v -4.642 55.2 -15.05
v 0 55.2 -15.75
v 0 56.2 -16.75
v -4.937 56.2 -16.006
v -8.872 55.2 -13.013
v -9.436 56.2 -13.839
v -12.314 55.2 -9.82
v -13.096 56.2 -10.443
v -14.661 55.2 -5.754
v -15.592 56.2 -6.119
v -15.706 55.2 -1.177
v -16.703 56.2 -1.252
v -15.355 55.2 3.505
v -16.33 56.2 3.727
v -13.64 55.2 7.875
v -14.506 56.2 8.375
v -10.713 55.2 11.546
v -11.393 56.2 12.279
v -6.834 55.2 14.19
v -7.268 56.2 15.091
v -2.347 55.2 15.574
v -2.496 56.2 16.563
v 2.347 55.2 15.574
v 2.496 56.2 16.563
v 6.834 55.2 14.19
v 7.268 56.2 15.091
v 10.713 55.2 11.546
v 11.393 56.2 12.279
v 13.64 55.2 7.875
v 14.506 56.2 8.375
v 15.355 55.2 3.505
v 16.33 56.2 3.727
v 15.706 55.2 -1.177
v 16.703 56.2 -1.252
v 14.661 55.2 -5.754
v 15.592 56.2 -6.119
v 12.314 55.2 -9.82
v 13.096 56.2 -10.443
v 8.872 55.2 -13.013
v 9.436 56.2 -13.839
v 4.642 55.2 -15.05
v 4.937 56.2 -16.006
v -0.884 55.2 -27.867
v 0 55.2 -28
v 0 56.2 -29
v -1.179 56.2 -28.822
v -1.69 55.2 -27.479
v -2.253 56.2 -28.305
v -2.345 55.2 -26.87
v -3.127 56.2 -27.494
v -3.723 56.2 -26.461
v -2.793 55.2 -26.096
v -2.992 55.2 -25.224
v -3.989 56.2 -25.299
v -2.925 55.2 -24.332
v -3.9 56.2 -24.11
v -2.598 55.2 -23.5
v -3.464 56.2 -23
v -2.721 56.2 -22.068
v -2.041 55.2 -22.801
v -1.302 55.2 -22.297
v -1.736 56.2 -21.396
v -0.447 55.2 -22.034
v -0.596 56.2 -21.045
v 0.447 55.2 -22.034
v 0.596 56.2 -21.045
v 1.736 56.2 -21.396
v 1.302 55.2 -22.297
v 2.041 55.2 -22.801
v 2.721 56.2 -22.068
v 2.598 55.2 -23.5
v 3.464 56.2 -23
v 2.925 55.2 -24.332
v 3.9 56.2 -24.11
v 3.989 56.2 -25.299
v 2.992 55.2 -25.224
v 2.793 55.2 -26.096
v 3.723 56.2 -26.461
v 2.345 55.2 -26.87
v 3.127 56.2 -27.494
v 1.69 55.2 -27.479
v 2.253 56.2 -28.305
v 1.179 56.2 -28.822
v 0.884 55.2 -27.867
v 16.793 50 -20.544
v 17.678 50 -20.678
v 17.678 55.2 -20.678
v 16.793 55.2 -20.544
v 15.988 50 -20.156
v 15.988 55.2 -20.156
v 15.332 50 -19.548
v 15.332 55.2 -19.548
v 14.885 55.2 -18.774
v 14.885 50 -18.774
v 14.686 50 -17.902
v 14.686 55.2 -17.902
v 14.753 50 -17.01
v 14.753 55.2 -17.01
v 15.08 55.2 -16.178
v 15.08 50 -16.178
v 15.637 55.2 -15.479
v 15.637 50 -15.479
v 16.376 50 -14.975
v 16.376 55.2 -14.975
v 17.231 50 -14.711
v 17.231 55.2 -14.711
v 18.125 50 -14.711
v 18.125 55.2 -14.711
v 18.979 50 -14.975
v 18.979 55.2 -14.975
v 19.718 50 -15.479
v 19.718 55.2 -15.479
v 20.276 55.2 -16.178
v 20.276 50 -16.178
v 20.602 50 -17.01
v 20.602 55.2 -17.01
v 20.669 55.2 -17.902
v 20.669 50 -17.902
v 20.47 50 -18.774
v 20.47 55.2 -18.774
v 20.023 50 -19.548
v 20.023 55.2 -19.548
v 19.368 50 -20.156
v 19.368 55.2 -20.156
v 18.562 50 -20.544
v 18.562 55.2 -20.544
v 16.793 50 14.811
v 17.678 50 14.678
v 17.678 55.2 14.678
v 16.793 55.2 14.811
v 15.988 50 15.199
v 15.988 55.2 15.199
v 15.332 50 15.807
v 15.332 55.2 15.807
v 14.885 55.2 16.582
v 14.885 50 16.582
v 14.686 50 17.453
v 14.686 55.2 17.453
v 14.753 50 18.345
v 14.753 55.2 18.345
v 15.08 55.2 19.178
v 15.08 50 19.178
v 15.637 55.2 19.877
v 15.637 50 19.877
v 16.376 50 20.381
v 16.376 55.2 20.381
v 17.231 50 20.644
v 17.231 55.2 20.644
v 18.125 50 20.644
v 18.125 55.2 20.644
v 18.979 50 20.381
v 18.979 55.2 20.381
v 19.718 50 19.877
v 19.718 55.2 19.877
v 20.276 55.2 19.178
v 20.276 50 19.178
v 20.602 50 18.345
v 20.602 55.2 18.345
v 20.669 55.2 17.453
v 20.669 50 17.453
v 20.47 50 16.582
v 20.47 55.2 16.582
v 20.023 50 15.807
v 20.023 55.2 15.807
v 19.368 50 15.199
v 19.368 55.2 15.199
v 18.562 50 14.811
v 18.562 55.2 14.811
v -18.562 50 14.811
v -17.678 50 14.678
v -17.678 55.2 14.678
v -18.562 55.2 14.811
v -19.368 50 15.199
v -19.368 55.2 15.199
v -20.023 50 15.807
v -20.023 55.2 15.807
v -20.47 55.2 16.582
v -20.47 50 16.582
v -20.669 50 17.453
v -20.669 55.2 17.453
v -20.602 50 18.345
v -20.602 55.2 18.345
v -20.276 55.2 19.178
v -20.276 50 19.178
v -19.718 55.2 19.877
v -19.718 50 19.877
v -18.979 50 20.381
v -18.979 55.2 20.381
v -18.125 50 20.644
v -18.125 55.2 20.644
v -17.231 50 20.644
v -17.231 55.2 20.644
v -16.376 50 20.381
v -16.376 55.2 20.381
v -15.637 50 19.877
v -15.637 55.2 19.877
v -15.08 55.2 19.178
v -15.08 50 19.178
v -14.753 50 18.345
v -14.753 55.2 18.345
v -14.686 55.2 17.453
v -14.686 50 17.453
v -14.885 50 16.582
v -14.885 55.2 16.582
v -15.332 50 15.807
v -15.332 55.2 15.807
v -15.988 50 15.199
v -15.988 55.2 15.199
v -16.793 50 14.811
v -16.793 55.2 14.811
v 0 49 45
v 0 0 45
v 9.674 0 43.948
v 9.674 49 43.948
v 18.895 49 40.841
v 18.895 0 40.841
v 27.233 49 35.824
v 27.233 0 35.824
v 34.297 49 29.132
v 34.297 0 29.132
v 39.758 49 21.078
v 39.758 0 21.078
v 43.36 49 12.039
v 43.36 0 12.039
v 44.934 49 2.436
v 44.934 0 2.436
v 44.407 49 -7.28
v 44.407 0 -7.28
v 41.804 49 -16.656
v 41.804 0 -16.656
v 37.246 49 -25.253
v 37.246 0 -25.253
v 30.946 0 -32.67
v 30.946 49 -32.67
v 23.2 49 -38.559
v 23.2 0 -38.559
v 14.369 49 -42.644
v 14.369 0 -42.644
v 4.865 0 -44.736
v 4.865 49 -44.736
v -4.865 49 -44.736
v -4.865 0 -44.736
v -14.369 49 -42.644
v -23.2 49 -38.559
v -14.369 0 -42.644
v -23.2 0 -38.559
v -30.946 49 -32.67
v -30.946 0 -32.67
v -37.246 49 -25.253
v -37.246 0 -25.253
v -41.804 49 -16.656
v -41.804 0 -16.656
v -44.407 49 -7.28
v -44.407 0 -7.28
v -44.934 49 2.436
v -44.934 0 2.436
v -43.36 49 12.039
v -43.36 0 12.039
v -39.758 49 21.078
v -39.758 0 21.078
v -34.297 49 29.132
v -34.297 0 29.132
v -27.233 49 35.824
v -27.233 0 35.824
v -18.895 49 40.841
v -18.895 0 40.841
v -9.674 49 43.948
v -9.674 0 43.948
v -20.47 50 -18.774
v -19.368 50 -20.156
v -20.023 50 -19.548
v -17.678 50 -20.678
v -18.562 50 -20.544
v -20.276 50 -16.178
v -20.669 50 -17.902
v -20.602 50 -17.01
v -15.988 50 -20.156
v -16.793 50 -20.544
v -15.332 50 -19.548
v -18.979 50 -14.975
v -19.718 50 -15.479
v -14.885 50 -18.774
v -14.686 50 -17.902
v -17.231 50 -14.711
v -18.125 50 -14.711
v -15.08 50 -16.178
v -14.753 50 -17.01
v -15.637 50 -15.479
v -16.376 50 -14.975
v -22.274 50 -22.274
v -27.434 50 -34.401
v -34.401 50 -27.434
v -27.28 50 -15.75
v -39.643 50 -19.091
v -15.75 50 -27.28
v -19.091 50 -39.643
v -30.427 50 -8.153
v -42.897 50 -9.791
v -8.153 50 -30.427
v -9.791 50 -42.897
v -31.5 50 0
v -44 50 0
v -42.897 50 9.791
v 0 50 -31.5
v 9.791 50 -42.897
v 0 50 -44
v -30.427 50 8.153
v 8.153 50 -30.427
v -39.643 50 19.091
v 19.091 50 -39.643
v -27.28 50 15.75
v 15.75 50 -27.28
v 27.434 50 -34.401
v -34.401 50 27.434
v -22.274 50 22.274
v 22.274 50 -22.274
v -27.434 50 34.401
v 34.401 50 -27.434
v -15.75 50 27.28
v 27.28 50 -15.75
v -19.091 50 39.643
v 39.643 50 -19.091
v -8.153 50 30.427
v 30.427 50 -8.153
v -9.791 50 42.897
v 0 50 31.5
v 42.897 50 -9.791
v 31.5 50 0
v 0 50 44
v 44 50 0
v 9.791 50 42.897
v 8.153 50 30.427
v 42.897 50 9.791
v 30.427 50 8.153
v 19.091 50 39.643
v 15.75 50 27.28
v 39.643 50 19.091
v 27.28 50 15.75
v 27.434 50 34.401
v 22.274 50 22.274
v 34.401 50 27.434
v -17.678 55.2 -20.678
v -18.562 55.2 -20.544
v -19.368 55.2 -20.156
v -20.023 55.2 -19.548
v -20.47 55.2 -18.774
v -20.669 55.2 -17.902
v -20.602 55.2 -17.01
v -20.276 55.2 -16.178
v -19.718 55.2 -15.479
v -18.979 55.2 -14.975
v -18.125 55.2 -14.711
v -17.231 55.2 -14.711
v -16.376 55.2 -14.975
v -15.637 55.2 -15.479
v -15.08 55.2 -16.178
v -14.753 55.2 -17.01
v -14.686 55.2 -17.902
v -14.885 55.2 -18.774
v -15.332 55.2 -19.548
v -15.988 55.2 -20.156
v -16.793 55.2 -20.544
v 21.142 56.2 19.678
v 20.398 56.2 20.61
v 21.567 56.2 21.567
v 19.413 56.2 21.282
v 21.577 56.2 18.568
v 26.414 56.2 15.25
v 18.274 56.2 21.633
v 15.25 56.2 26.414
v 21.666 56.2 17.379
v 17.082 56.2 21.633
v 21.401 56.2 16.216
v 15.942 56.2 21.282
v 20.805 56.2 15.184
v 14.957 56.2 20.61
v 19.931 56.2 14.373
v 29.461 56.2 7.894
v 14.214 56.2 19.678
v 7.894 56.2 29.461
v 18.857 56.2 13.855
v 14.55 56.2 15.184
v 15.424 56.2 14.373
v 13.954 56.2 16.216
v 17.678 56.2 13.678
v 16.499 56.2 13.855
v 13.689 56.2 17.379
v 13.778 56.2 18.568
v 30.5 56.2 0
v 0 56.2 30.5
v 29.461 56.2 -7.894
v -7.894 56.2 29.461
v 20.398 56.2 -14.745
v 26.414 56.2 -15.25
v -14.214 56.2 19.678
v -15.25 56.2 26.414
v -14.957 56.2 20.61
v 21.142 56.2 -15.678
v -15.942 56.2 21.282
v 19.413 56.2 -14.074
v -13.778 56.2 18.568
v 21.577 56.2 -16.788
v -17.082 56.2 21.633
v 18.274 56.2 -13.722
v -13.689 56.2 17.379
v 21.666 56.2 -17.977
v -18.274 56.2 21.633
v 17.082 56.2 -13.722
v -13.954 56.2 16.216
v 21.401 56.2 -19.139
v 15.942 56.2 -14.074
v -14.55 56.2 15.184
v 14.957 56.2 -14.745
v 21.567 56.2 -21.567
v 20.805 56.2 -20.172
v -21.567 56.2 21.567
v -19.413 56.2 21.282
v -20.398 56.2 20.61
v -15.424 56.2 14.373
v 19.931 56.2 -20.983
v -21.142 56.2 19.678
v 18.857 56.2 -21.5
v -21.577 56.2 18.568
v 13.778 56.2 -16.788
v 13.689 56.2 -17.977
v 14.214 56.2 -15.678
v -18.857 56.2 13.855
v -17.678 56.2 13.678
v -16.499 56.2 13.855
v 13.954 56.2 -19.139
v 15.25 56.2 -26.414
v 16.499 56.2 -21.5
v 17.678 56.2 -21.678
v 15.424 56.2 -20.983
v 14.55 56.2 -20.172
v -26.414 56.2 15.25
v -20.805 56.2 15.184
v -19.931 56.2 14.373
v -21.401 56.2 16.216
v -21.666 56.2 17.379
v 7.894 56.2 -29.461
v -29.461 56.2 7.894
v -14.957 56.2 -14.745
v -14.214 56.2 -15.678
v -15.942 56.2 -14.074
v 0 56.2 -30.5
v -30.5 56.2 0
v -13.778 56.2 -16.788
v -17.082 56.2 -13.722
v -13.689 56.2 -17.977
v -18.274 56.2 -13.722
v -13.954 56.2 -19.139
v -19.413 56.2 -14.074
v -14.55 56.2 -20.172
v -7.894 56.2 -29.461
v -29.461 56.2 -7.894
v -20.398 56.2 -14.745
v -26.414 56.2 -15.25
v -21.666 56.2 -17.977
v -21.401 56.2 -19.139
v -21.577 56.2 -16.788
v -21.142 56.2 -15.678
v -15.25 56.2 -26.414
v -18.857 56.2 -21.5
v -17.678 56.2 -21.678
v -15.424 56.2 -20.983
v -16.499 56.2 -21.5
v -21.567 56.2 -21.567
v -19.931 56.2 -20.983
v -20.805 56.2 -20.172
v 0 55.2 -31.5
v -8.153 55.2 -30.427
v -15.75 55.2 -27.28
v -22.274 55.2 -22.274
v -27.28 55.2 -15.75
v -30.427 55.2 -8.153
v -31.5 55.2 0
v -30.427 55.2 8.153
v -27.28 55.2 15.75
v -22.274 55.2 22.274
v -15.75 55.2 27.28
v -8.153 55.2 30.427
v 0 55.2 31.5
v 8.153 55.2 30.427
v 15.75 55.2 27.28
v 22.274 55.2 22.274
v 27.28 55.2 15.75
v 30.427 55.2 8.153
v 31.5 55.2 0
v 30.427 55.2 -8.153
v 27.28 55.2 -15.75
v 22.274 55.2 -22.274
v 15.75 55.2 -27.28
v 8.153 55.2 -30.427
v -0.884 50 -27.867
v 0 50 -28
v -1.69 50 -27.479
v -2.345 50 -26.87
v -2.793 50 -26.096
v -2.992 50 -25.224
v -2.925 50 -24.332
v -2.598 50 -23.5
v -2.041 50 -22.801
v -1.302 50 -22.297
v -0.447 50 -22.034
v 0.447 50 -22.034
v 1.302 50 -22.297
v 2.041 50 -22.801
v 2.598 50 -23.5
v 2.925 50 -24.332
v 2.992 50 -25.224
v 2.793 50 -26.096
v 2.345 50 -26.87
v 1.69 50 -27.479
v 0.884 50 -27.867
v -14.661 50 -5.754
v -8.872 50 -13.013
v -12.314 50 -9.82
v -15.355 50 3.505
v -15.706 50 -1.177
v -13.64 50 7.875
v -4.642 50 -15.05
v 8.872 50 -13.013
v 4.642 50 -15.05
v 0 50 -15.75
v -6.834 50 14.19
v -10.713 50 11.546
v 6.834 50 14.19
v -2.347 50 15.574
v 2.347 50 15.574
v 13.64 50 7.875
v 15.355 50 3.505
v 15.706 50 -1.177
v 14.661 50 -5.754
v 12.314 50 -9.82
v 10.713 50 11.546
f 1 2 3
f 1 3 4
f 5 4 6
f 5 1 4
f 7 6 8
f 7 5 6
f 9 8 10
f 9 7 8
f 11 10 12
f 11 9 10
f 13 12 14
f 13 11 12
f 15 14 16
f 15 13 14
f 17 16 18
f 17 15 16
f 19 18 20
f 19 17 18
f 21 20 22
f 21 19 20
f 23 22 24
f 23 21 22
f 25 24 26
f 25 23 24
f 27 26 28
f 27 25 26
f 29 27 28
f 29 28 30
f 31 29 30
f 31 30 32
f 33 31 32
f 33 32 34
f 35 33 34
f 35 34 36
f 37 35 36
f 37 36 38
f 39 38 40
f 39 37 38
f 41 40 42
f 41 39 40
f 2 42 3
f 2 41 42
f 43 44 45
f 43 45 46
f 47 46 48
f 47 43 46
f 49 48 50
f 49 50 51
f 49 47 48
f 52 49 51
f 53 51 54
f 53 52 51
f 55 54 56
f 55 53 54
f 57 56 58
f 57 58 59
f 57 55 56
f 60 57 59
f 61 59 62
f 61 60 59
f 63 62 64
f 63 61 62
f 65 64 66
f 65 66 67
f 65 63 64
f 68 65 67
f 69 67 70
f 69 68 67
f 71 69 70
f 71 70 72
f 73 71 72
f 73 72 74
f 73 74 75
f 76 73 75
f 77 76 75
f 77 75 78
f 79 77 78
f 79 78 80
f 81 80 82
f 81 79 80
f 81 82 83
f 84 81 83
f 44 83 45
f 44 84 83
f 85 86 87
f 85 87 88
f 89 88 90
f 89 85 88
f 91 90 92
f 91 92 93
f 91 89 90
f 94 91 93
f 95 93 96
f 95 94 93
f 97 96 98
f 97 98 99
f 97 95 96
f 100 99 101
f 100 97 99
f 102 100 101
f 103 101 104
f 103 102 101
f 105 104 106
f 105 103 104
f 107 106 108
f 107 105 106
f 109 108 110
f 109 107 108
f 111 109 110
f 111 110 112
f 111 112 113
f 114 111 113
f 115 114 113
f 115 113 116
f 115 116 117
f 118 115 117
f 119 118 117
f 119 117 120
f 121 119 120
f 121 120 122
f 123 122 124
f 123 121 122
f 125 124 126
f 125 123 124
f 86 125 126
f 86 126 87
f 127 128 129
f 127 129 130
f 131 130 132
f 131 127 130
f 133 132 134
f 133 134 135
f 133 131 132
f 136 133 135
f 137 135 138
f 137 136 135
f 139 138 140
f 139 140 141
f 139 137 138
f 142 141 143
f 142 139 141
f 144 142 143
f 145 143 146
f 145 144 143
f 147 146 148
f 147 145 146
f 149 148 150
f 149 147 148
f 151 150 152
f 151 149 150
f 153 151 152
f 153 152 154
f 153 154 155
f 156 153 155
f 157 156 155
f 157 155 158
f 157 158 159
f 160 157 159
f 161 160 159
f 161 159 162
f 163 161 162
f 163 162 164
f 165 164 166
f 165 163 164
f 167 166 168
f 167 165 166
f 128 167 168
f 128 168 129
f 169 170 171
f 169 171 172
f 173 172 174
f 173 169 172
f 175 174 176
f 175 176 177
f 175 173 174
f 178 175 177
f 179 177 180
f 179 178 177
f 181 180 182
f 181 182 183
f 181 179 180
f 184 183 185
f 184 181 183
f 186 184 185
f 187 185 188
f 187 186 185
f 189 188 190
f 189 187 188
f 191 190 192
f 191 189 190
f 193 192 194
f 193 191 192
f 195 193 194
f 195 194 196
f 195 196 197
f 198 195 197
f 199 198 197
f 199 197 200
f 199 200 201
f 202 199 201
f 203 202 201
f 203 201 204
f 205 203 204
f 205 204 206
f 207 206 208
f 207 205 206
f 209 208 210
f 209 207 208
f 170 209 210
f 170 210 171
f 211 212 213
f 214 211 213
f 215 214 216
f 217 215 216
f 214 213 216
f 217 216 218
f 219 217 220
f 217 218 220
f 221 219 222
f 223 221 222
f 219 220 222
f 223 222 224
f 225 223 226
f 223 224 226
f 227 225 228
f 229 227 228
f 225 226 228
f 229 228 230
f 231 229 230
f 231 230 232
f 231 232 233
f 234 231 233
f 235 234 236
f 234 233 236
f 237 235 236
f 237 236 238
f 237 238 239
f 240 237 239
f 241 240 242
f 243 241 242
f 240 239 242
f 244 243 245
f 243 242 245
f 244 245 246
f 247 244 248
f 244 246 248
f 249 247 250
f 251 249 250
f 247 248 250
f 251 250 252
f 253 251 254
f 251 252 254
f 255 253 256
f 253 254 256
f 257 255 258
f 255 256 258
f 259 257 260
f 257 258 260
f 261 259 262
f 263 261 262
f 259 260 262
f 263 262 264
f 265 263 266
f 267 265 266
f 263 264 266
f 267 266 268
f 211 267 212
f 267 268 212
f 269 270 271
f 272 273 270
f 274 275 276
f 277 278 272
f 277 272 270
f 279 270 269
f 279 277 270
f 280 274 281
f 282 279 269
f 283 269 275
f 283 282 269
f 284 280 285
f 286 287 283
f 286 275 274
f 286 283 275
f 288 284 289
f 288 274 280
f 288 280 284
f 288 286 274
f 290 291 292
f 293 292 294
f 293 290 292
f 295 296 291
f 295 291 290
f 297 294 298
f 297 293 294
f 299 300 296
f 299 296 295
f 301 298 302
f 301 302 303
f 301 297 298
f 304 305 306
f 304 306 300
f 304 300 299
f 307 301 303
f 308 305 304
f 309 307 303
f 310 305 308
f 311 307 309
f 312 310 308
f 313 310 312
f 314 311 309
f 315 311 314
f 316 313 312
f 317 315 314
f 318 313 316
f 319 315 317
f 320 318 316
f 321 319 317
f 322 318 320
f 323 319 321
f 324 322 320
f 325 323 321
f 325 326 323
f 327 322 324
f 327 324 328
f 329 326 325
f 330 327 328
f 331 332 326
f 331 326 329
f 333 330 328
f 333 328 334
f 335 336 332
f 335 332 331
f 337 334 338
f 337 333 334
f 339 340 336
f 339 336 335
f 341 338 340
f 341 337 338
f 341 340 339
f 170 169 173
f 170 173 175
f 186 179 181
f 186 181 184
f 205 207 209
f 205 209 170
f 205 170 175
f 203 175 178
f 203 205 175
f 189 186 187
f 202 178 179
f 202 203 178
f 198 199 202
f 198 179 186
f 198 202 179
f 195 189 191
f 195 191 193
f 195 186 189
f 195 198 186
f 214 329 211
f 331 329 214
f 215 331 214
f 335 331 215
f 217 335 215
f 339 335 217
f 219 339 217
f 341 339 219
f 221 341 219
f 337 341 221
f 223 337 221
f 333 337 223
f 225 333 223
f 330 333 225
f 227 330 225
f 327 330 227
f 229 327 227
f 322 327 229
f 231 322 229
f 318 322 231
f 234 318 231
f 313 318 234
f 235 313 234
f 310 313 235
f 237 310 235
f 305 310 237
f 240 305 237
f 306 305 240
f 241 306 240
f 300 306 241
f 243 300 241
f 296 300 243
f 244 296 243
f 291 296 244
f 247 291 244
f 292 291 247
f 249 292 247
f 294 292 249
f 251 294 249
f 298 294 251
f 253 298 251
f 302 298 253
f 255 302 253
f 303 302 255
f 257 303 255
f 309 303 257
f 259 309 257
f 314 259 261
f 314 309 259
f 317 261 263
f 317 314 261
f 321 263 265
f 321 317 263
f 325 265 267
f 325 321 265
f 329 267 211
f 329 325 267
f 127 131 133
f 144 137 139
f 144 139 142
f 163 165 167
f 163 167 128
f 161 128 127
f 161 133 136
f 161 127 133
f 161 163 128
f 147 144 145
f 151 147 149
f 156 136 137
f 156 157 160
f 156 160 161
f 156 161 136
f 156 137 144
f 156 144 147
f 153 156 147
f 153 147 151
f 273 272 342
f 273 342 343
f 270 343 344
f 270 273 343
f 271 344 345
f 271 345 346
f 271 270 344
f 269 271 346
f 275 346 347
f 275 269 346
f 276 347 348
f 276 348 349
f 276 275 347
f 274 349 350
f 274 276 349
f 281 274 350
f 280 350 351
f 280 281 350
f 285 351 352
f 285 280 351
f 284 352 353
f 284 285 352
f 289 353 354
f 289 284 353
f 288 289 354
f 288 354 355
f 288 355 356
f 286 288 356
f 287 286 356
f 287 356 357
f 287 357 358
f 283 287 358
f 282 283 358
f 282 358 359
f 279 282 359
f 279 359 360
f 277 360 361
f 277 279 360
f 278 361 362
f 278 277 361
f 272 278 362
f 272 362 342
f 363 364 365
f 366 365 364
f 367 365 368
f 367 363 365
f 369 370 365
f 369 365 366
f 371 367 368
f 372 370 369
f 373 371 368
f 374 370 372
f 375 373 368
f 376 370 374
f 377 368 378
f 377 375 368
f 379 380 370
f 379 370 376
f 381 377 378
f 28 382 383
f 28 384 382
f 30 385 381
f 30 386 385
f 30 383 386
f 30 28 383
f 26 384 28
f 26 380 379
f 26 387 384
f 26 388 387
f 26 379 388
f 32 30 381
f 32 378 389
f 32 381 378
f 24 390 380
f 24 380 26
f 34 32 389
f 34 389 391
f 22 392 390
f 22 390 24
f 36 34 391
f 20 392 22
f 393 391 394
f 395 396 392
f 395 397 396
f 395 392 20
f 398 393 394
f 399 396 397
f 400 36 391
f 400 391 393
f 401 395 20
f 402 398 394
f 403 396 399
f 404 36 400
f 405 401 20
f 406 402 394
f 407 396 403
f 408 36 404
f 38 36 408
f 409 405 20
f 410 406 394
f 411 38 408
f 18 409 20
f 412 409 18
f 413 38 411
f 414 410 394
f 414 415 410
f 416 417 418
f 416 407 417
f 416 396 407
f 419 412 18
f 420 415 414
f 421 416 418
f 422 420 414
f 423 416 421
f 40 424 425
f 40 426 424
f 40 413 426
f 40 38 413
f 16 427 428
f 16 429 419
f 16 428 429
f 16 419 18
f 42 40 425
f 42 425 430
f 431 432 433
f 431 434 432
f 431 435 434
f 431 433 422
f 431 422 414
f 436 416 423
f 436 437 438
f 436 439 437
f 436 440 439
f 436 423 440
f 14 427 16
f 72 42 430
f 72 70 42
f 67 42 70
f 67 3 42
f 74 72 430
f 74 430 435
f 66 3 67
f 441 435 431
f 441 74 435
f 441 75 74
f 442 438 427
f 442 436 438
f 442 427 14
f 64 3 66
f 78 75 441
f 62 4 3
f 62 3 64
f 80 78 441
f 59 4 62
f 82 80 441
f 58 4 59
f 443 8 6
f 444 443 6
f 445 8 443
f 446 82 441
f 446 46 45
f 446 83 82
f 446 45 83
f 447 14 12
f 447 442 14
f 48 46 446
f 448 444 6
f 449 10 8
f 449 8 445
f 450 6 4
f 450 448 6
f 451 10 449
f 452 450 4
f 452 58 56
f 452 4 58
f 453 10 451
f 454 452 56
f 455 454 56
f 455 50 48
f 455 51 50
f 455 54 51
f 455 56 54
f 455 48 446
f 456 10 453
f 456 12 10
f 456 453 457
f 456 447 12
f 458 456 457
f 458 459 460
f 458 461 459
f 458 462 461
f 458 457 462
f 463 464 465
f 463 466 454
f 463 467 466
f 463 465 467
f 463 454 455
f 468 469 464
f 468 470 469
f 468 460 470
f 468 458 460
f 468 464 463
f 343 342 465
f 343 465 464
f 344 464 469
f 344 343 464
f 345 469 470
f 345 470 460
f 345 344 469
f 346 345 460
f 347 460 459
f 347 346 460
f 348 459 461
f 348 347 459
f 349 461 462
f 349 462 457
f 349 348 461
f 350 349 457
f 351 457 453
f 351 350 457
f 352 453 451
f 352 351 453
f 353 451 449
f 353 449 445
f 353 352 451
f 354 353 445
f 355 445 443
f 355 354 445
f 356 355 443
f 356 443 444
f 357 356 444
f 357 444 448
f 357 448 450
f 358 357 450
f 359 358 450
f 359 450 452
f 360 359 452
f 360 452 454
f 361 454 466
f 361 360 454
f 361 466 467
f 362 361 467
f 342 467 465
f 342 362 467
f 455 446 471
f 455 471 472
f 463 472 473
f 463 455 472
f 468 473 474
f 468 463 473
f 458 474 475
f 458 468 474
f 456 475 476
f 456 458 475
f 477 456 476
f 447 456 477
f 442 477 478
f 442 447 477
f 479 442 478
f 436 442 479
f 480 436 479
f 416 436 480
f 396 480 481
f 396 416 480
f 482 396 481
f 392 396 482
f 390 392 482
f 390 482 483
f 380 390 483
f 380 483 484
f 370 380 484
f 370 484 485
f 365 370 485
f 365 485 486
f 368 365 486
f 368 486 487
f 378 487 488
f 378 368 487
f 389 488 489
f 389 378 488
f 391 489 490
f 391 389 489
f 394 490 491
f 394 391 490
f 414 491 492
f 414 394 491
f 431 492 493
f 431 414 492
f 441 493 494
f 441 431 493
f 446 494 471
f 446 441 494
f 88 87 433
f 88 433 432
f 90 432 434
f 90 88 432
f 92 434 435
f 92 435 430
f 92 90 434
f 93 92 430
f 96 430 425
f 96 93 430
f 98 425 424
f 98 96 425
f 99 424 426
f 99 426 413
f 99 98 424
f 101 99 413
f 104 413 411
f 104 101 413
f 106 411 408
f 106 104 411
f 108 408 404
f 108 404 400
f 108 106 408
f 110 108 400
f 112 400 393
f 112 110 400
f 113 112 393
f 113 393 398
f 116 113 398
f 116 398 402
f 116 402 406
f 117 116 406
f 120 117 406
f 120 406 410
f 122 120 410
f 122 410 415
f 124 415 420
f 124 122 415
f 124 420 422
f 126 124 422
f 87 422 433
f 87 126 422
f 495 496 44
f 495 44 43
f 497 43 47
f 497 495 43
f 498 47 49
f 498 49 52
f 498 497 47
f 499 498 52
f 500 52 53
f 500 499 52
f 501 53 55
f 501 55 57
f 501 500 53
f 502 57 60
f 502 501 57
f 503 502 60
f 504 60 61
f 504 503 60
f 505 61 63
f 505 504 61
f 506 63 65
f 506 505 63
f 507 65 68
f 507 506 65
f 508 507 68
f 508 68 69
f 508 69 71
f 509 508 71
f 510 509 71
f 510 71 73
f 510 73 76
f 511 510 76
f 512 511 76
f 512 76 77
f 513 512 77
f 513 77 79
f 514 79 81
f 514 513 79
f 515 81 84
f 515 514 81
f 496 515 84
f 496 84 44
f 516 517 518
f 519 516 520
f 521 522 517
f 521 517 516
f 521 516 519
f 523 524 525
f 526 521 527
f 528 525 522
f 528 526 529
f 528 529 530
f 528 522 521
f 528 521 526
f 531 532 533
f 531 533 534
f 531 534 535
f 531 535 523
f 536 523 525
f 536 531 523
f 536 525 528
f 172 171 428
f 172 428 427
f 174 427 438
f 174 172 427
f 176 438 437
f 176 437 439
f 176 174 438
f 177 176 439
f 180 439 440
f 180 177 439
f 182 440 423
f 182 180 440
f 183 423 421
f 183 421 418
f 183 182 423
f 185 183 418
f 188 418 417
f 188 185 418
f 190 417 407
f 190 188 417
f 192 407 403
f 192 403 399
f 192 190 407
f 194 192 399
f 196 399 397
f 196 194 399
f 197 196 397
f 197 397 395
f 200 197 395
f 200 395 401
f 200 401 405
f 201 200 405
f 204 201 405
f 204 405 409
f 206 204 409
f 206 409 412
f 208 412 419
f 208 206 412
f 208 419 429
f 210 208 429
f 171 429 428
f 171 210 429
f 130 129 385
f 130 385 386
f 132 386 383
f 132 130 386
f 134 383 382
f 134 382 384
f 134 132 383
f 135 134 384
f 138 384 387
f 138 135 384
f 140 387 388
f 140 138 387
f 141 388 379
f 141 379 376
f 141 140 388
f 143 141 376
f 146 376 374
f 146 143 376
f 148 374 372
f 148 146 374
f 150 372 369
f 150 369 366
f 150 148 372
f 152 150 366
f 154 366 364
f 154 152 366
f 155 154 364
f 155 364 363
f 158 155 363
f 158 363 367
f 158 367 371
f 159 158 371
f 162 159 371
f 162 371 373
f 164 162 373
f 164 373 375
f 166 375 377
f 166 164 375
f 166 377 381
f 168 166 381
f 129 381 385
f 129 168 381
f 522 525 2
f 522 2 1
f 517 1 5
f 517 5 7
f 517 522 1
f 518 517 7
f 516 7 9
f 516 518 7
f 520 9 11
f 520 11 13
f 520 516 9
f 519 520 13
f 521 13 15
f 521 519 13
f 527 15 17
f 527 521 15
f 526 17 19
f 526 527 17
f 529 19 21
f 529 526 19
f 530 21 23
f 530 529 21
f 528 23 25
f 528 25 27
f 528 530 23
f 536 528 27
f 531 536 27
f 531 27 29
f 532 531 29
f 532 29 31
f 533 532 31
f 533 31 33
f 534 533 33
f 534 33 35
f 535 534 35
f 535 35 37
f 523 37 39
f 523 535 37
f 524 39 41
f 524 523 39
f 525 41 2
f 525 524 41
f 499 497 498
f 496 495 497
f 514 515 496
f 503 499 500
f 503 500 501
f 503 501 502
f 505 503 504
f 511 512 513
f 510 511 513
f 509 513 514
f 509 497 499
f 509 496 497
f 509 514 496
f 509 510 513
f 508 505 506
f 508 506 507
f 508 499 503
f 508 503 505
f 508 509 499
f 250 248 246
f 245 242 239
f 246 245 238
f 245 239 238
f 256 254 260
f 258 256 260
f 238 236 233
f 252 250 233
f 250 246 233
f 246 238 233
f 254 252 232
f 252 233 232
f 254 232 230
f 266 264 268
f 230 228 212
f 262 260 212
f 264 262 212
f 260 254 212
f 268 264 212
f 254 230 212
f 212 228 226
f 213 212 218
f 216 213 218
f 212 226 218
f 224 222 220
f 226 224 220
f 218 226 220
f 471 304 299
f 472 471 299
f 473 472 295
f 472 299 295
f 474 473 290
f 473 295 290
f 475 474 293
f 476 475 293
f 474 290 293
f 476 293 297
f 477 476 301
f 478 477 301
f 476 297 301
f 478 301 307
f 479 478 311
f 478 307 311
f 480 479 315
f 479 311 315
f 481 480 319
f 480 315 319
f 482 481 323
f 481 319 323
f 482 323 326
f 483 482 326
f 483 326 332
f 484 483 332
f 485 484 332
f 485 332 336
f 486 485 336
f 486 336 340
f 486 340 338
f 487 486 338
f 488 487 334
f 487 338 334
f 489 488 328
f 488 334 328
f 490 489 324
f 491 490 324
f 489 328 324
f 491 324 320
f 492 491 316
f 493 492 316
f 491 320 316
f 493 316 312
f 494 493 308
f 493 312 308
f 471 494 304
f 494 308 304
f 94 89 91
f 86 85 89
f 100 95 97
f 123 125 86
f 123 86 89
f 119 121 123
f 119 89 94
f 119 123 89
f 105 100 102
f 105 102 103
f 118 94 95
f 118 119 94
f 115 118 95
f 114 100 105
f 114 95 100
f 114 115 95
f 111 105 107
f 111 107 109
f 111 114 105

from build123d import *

# Parameters (mm, degrees)
SKIZZE1_R                       = 45
AUFSATZ_LINEAR_AUSTRAGEN1_DEPTH = 50
SKIZZE2_R                       = 31.5
SKIZZE2_R_2                     = 15.75
SKIZZE2_R_3                     = 3
AUFSATZ_LINEAR_AUSTRAGEN2_DEPTH = 6.2
FASE1_SIZE                      = 1


with BuildPart() as part:
    # Skizze1 → Aufsatz-Linear austragen1 (new body)
    with BuildSketch(Plane(origin=(0, 0, 0), x_dir=(1, 0, 0), z_dir=(0, 1, 0))):
        with Locations(Location((0, 0, 0), (0, 0, 270))):
            Circle(SKIZZE1_R)
    extrude(amount=AUFSATZ_LINEAR_AUSTRAGEN1_DEPTH)

    # Skizze2 → Aufsatz-Linear austragen2 (add)
    with BuildSketch(Plane(origin=(0, 50, 0), x_dir=(1, 0, 0), z_dir=(0, 1, 0))):
        with Locations(Location((0, 0, 0), (0, 0, 90))):
            Circle(SKIZZE2_R)
        with Locations(Location((0, 0, 0), (0, 0, 90))):
            Circle(SKIZZE2_R_2, mode=Mode.SUBTRACT)
        with Locations(Location((17.67766953, 17.67766953, 0), (0, 0, 90))):
            Circle(SKIZZE2_R_3, mode=Mode.SUBTRACT)
        with Locations(Location((0, 25, 0), (0, 0, 90))):
            Circle(SKIZZE2_R_3, mode=Mode.SUBTRACT)
        with Locations(Location((17.67766953, -17.67766953, 0), (0, 0, 90))):
            Circle(SKIZZE2_R_3, mode=Mode.SUBTRACT)
        with Locations(Location((-17.67766953, -17.67766953, 0), (0, 0, 90))):
            Circle(SKIZZE2_R_3, mode=Mode.SUBTRACT)
        with Locations(Location((-17.67766953, 17.67766953, 0), (0, 0, 90))):
            Circle(SKIZZE2_R_3, mode=Mode.SUBTRACT)
    extrude(amount=AUFSATZ_LINEAR_AUSTRAGEN2_DEPTH)

    # Fase1
    fase1_edges = [part.edges().sort_by_distance(p)[0] for p in [
        (0, 56.2, 31.5),
        (0, 56.2, 15.75),
        (17.67766953, 56.2, -14.67766953),
        (0, 56.2, -22),
        (17.67766953, 56.2, 20.67766953),
        (-17.67766953, 56.2, 20.67766953),
        (-17.67766953, 56.2, -14.67766953),
        (0, 50, -45),
    ]]
    chamfer(fase1_edges, length=FASE1_SIZE)


solid = part.part
